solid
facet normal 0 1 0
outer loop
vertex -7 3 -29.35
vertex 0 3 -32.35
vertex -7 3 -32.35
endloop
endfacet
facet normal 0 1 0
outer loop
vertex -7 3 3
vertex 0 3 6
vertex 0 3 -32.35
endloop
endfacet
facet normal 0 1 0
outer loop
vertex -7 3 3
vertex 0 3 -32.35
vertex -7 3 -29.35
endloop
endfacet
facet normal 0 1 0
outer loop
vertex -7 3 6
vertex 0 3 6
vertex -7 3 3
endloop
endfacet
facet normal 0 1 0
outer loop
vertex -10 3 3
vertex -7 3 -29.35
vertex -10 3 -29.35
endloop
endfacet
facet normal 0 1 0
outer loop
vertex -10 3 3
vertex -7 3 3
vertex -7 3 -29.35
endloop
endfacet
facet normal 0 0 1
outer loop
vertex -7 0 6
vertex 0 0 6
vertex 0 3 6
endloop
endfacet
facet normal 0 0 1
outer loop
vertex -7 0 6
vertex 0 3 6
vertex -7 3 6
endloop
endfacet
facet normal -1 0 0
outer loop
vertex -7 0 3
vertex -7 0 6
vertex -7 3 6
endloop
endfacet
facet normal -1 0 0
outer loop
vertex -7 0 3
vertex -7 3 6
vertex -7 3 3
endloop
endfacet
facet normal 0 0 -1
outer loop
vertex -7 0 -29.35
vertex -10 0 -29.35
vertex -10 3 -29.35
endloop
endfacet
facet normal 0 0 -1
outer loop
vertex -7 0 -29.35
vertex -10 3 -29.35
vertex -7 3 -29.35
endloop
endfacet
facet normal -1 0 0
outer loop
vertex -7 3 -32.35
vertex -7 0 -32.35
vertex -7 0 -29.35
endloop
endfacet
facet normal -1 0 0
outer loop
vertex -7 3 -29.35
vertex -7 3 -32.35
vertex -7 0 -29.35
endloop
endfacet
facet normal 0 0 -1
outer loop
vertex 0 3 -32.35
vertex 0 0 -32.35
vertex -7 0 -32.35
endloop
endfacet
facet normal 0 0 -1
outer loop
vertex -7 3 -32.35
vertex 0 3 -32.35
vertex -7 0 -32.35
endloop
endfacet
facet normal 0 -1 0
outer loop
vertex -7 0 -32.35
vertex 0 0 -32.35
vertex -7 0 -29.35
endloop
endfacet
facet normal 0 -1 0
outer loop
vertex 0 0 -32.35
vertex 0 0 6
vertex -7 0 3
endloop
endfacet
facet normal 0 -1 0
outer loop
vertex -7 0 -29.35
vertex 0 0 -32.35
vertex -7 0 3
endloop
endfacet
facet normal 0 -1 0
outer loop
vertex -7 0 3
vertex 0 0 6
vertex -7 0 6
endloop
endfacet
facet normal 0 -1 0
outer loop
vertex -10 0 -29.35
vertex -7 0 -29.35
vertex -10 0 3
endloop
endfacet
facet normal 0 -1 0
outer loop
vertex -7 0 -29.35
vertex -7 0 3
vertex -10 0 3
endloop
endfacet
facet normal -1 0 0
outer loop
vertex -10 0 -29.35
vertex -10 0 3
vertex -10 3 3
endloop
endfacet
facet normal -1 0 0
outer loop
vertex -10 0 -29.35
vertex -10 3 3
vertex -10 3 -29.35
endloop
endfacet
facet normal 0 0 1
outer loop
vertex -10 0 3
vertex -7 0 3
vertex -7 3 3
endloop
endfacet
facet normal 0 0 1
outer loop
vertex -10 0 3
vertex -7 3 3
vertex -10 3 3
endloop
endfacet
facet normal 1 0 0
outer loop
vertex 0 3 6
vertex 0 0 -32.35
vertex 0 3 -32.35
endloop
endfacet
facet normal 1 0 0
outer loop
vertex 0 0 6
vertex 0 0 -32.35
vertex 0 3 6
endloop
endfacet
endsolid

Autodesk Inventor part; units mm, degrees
ref_plane "YZ Plane" through (0, 0, 0) normal (1, 0, 0) x (0, 1, 0)
ref_plane "XZ Plane" through (0, 0, 0) normal (0, 1, 0) x (-1, 0, 0)
ref_plane "XY Plane" through (0, 0, 0) normal (0, 0, 1) x (1, 0, 0)
sketch "Boceto1" plane through (0, 0, 0) normal (0, 1, 0) x (-1, 0, 0)
  line L0 (10, 0) -> (10, -26.35)
  line L1 (0, -26.35) -> (0, 0)
  line L2 (0, 0) -> (0, 3)
  line L3 (0, 3) -> (10, 3)
  line L4 (10, 3) -> (10, 0)
  line L5 (10, -26.35) -> (10, -29.35)
  line L6 (10, -29.35) -> (0, -29.35)
  line L7 (0, -29.35) -> (0, -26.35)
extrude "Extrusión1" add sketch "Boceto1" along normal blind 3
sketch "Boceto3" plane through (0, 0, 0) normal (0, -1, 0) x (1, 0, 0)
  line L0 (0, 3) -> (0, 6)
  line L1 (0, 6) -> (-7, 6)
  line L2 (-7, 6) -> (-7, 3)
  line L3 (-7, 3) -> (0, 3)
  line L4 (0, -29.35) -> (0, -32.35)
  line L5 (0, -32.35) -> (-7, -32.35)
  line L6 (-7, -32.35) -> (-7, -29.35)
  line L7 (0, -29.35) -> (-7, -29.35)
  point P0 (0, 0)
extrude "Extrusión3" add sketch "Boceto3" against normal blind 3
properties part number "muñeca2"
